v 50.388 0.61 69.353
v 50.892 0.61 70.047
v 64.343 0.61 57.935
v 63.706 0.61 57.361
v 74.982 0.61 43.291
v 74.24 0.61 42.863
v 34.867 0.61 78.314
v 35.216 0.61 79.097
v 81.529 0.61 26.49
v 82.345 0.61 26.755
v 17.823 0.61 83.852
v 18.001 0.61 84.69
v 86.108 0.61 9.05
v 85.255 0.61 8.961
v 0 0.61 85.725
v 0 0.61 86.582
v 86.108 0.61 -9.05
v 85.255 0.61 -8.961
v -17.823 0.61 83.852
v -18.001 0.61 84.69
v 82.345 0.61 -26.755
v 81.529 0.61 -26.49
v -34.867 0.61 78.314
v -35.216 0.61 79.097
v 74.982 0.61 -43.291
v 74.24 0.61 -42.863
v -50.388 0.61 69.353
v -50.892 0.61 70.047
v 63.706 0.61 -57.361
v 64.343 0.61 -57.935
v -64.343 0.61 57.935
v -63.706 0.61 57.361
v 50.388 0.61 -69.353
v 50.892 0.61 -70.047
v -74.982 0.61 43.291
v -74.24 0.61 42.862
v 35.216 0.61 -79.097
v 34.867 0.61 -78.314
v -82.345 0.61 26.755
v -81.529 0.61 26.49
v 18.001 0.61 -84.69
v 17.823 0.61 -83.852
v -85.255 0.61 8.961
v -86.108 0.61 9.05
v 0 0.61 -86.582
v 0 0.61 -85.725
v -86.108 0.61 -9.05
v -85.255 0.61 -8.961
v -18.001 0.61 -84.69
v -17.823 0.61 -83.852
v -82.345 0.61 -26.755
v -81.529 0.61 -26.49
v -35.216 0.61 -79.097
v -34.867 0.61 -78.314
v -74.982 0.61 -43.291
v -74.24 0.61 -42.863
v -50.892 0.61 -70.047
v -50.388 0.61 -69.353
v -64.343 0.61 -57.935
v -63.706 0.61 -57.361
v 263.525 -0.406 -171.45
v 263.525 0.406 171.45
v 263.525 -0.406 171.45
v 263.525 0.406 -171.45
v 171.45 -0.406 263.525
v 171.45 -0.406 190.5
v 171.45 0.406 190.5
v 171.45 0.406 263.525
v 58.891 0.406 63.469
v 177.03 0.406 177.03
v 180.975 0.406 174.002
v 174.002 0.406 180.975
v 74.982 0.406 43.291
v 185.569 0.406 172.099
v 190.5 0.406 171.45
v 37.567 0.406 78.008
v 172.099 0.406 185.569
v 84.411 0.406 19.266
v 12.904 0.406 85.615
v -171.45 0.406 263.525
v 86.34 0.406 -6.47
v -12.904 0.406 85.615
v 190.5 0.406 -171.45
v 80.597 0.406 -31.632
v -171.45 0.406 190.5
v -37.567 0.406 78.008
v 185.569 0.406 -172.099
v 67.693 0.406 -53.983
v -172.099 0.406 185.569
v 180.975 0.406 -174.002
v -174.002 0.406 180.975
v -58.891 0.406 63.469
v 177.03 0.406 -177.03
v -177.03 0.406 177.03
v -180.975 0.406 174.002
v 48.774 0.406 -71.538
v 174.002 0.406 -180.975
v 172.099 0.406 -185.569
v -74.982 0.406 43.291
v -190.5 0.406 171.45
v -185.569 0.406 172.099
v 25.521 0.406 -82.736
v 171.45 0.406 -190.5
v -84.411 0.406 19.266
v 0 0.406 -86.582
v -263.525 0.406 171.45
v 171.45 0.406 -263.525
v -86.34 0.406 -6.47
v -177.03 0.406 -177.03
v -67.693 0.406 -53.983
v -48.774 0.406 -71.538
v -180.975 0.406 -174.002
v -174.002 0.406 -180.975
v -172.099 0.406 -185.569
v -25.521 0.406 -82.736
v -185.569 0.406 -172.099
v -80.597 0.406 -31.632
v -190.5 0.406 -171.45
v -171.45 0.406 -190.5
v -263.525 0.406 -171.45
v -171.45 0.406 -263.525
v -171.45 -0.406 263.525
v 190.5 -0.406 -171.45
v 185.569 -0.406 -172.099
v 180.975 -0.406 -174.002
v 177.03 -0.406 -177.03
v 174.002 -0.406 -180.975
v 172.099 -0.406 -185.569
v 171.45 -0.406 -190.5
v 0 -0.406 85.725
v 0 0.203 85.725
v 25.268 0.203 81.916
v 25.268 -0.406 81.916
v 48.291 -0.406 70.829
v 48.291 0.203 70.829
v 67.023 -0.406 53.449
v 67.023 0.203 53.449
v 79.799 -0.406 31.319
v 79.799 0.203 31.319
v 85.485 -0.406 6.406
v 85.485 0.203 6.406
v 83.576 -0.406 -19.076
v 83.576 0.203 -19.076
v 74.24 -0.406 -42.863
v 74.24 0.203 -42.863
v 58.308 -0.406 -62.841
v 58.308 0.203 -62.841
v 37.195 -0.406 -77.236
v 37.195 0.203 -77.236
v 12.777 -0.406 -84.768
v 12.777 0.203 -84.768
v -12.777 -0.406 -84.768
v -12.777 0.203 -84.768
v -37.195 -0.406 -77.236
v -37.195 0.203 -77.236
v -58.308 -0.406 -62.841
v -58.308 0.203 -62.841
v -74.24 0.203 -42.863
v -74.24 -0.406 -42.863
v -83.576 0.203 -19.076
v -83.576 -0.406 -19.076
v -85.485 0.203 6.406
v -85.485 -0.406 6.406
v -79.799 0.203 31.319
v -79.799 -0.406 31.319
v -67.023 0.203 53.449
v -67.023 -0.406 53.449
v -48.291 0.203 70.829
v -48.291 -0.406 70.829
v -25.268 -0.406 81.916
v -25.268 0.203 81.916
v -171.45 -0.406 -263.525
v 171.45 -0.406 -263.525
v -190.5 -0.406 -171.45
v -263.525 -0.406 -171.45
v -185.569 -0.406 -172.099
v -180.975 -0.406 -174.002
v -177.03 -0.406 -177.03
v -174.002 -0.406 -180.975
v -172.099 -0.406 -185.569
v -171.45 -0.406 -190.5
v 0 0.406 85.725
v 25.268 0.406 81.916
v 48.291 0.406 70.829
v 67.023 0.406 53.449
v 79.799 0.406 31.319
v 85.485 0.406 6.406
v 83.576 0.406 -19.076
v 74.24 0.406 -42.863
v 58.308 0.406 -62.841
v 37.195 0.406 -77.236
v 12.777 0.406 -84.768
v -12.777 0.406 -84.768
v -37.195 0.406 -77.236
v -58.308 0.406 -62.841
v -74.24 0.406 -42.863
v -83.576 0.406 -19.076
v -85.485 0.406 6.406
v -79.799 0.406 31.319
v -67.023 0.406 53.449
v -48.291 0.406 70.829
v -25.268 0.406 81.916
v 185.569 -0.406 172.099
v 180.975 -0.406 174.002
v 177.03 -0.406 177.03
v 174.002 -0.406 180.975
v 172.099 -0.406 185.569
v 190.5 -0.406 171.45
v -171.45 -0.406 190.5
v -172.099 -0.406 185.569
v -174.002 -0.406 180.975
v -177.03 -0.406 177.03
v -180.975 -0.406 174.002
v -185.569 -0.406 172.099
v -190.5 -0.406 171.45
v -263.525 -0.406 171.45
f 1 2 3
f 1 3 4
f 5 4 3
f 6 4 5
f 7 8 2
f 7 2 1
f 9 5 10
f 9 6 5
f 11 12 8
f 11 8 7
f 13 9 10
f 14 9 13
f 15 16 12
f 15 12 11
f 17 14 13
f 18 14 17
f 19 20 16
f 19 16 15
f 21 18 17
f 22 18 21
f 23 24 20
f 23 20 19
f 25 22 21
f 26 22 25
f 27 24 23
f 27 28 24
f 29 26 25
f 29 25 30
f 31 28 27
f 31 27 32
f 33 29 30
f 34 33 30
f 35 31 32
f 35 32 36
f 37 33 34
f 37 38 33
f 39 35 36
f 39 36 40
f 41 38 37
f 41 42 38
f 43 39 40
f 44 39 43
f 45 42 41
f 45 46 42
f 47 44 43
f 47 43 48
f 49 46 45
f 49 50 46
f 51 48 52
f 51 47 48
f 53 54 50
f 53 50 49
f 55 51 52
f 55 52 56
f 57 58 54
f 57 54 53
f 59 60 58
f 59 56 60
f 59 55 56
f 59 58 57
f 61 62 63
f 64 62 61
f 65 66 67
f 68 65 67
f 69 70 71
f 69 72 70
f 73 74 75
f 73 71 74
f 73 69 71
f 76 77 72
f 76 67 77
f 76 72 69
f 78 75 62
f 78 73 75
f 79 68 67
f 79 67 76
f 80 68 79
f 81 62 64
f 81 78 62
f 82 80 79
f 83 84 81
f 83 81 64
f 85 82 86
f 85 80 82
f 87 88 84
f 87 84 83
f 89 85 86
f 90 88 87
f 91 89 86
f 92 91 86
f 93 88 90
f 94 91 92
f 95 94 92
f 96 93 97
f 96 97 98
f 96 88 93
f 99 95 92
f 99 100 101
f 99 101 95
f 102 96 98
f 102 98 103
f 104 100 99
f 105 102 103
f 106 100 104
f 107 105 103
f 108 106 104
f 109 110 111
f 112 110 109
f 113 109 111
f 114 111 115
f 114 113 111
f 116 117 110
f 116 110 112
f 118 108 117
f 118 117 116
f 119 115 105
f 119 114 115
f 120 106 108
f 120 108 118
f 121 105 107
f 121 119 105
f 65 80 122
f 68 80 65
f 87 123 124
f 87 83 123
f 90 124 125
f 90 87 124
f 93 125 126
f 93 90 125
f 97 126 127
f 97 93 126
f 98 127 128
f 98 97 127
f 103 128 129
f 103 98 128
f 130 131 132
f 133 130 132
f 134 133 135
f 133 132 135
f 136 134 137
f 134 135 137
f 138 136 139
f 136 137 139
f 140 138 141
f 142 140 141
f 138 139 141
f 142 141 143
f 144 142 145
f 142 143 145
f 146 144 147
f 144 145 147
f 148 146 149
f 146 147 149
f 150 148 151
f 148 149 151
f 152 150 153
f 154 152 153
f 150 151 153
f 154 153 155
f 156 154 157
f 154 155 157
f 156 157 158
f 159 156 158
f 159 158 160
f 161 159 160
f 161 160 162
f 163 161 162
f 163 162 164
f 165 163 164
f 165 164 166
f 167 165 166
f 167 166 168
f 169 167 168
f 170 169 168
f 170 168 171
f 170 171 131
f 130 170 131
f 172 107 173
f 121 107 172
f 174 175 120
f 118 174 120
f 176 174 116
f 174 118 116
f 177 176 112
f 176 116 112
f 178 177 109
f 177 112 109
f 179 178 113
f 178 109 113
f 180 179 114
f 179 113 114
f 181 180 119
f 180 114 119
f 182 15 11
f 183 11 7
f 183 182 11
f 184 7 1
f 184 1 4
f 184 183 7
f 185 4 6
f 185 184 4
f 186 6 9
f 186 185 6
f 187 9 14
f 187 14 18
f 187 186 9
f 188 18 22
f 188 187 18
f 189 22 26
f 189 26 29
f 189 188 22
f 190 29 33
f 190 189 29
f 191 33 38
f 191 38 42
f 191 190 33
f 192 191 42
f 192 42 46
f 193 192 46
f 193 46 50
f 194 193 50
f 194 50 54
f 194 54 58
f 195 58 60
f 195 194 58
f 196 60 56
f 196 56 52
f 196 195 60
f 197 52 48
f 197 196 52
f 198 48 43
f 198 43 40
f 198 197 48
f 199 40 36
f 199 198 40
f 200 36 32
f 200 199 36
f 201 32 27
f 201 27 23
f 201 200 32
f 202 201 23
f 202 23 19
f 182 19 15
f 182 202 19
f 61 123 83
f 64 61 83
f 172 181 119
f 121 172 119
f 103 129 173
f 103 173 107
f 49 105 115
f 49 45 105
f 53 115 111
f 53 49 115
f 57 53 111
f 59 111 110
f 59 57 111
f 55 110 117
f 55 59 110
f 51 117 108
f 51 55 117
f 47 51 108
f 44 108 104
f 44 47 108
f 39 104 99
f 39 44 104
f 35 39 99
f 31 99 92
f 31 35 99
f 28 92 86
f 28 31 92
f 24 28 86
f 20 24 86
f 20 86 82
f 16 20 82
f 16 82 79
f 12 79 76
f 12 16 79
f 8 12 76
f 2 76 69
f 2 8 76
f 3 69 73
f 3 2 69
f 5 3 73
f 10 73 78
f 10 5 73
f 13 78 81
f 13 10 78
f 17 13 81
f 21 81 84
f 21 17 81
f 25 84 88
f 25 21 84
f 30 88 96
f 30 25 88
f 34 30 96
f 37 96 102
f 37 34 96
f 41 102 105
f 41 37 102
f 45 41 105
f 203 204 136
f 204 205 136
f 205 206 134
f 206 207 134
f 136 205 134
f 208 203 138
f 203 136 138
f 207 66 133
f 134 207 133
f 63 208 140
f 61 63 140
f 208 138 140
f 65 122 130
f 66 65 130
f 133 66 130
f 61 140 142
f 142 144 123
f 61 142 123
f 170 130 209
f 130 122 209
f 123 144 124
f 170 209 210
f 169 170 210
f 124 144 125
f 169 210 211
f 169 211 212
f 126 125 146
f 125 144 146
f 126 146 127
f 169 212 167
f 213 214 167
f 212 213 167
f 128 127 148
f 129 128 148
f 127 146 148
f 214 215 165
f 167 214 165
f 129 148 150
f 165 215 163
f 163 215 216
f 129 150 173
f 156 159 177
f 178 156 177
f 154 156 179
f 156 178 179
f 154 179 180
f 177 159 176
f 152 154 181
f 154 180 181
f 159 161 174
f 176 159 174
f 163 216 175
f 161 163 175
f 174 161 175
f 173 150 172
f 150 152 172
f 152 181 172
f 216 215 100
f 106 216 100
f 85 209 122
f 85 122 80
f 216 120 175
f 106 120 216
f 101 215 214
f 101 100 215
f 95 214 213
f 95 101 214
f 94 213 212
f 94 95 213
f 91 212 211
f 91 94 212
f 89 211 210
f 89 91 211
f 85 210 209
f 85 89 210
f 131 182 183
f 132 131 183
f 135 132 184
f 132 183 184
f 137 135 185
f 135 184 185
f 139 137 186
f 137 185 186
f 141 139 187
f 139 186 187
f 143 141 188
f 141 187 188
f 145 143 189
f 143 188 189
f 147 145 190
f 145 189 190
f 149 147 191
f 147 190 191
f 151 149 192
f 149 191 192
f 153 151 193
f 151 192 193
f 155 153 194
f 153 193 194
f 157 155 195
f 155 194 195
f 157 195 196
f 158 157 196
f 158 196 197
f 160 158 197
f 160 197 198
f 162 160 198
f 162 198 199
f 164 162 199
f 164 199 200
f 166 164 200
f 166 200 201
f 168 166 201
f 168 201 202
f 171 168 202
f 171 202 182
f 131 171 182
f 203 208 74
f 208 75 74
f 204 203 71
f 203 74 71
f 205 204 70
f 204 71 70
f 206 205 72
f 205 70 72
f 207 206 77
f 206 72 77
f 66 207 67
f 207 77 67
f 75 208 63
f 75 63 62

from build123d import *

# Parameters (mm, degrees)
SKETCH1_W           = 342.9
SKETCH1_H           = 342.9
BOSS_EXTRUDE1_DEPTH = 0.4064
SKETCH4_W           = 342.9
SKETCH4_H           = 0.8128
BOSS_EXTRUDE3_DEPTH = 92.075
CIRPATTERN1_COUNT   = 4
FILLET1_R           = 19.05
SKETCH7_R           = 85.725
CUT_EXTRUDE1_DEPTH  = 88.9
SKETCH7_3_R         = 86.58225
SKETCH7_3_R_2       = 85.725
BOSS_EXTRUDE4_DEPTH = 0.2032


with BuildPart() as part:
    # Sketch1 → Boss-Extrude1 (new, symmetric)
    with BuildSketch(Plane(origin=(0, 0, 0), x_dir=(1, 0, 0), z_dir=(0, 1, 0))):
        Rectangle(SKETCH1_W, SKETCH1_H)
    extrude(amount=BOSS_EXTRUDE1_DEPTH, both=True)

    # Sketch4 → Boss-Extrude3 (add)
    with BuildSketch(Plane.ZY.offset(171.45)):
        Rectangle(SKETCH4_W, SKETCH4_H)
    boss_extrude3 = extrude(amount=BOSS_EXTRUDE3_DEPTH)

    # CirPattern1: Boss-Extrude3 ×4 about axis
    cirpattern1_axis = Axis((0, 2.794, 0), (0, -1, 0))
    for i in range(1, CIRPATTERN1_COUNT):
        add(boss_extrude3.rotate(cirpattern1_axis, i * 360 / CIRPATTERN1_COUNT))

    # Fillet1
    fillet1_edges = [part.edges().sort_by_distance(p)[0] for p in [
        (-171.45, 0, -171.45),
        (-171.45, 0, 171.45),
        (171.45, 0, 171.45),
        (171.45, 0, -171.45),
    ]]
    fillet(fillet1_edges, radius=FILLET1_R)

    # Sketch7 → Cut-Extrude1 (cut)
    with BuildSketch(Plane(origin=(0, 0.4064, 0), x_dir=(1, 0, 0), z_dir=(0, 1, 0))):
        Circle(SKETCH7_R)
    extrude(amount=-CUT_EXTRUDE1_DEPTH, mode=Mode.SUBTRACT)

    # Sketch7<3> → Boss-Extrude4 (add, symmetric)
    with BuildSketch(Plane(origin=(0, 0.4064, 0), x_dir=(1, 0, 0), z_dir=(0, 1, 0))):
        Circle(SKETCH7_3_R)
        Circle(SKETCH7_3_R_2, mode=Mode.SUBTRACT)
    extrude(amount=BOSS_EXTRUDE4_DEPTH, both=True)


solid = part.part
